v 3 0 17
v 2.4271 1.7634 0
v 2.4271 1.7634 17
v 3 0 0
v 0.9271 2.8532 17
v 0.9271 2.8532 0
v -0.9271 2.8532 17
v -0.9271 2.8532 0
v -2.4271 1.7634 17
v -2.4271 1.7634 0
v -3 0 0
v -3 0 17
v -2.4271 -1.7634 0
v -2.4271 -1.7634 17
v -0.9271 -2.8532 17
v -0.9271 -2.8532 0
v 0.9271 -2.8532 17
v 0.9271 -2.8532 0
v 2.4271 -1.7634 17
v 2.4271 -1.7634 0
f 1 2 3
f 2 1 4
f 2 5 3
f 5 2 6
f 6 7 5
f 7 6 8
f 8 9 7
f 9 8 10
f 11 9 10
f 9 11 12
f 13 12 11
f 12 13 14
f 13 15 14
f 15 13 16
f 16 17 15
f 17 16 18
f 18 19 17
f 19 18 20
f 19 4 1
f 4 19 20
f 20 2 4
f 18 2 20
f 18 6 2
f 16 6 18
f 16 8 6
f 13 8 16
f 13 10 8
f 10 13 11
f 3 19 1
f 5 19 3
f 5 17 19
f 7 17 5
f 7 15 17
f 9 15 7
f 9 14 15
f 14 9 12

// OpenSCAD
// Generated by SolidPython 1.0.1 on 2020-07-29 00:46:45


cylinder(h = 17, r1 = 3, r2 = 3);
/***********************************************
*********      SolidPython code:      **********
************************************************
 
# import packages: SolidPython
from solid import *
from solid.utils import *
from itertools import chain, combinations, permutations


class Resize:

    def __init__(self, scad_file):
        self.scad_file = scad_file
        #self.scad_file = import_scad(scad_file)
        # cone/cylinder param:
        self.r1 = 0
        self.r2 = 0
        self.h = 0
        # rectangular prism param:
        self.w = 0
        self.l = 0
        # ellipse param:
        self.r = 0

    # import OpenScad code (file name corresponds to shape)


    # classify shape + parameters
    def assign(self, param1, param2, param3):
        if self.scad_file == 'cone.scad':
            self.r1 = param1
            self.r2 = param2
            self.h = param3
        elif self.scad_file == 'cylinder.scad':
            self.r1 = param1
            self.r2 = param2
            self.h = param3
        elif self.scad_file == 'rectangularPrism.scad':
            self.h = param1
            self.l = param2
            self.w = param3
        else:
            self.r = param1
            self.h = param2

    # resize parameters
    def iterate(self):
        x = range(3, 20, 2)
        i = 1
        if self.scad_file == 'cone.scad':
            tempList = list(permutations(x, 2))
            for temp in tempList:
                param1 = temp[0]
                param2 = temp[1]
                filepath = 'produced_scad_files/' + 'cone' + str(param1) + '_' + str(param2) + '_' + '.scad'
                scad_render_to_file(cylinder(h=param1, r1=param2, r2=0), filepath)

        elif self.scad_file == 'cylinder.scad':
            tempList = list(permutations(x, 3))
            for temp in tempList:
                param1 = temp[0]
                param2 = temp[1]
                filepath = 'produced_scad_files/' + 'cylinder' + str(param1) + '_' + str(param2) + '_' + '.scad'
                scad_render_to_file(cylinder(h=param1, r1=param2, r2=param2), filepath)

        elif self.scad_file == 'rectangularPrism.scad':
            tempList = list(permutations(x, 3))
            for temp in tempList:
                param1 = temp[0]
                param2 = temp[1]
                param3 = temp[2]
                filepath = 'produced_scad_files/' + 'rectangularPrism' + str(param1) + '_' + str(param2) + '_' + str(
                    param3) + '.scad'
                scad_render_to_file(cube(size=(param1, param2, param3)), filepath)

        elif self.scad_file == 'ellipse.scad':
            tempList = list(permutations(x, 4))
            for temp in tempList:
                param1 = temp[0]
                param2 = temp[1]
                param3 = temp[2]
                param4 = temp[3]
                filepath = 'produced_scad_files/' + 'ellipse' + str(param1) + '_' + str(param2) + '_' + str(param3) + '_' + str(param4) + '.scad'
                scad_render_to_file(scale([param1, param2, param3])(sphere(r=param4)), filepath)

    def render_to_scadfile(self):
        scad_render_to_file(scad, 'example.scad') 
 
************************************************/
